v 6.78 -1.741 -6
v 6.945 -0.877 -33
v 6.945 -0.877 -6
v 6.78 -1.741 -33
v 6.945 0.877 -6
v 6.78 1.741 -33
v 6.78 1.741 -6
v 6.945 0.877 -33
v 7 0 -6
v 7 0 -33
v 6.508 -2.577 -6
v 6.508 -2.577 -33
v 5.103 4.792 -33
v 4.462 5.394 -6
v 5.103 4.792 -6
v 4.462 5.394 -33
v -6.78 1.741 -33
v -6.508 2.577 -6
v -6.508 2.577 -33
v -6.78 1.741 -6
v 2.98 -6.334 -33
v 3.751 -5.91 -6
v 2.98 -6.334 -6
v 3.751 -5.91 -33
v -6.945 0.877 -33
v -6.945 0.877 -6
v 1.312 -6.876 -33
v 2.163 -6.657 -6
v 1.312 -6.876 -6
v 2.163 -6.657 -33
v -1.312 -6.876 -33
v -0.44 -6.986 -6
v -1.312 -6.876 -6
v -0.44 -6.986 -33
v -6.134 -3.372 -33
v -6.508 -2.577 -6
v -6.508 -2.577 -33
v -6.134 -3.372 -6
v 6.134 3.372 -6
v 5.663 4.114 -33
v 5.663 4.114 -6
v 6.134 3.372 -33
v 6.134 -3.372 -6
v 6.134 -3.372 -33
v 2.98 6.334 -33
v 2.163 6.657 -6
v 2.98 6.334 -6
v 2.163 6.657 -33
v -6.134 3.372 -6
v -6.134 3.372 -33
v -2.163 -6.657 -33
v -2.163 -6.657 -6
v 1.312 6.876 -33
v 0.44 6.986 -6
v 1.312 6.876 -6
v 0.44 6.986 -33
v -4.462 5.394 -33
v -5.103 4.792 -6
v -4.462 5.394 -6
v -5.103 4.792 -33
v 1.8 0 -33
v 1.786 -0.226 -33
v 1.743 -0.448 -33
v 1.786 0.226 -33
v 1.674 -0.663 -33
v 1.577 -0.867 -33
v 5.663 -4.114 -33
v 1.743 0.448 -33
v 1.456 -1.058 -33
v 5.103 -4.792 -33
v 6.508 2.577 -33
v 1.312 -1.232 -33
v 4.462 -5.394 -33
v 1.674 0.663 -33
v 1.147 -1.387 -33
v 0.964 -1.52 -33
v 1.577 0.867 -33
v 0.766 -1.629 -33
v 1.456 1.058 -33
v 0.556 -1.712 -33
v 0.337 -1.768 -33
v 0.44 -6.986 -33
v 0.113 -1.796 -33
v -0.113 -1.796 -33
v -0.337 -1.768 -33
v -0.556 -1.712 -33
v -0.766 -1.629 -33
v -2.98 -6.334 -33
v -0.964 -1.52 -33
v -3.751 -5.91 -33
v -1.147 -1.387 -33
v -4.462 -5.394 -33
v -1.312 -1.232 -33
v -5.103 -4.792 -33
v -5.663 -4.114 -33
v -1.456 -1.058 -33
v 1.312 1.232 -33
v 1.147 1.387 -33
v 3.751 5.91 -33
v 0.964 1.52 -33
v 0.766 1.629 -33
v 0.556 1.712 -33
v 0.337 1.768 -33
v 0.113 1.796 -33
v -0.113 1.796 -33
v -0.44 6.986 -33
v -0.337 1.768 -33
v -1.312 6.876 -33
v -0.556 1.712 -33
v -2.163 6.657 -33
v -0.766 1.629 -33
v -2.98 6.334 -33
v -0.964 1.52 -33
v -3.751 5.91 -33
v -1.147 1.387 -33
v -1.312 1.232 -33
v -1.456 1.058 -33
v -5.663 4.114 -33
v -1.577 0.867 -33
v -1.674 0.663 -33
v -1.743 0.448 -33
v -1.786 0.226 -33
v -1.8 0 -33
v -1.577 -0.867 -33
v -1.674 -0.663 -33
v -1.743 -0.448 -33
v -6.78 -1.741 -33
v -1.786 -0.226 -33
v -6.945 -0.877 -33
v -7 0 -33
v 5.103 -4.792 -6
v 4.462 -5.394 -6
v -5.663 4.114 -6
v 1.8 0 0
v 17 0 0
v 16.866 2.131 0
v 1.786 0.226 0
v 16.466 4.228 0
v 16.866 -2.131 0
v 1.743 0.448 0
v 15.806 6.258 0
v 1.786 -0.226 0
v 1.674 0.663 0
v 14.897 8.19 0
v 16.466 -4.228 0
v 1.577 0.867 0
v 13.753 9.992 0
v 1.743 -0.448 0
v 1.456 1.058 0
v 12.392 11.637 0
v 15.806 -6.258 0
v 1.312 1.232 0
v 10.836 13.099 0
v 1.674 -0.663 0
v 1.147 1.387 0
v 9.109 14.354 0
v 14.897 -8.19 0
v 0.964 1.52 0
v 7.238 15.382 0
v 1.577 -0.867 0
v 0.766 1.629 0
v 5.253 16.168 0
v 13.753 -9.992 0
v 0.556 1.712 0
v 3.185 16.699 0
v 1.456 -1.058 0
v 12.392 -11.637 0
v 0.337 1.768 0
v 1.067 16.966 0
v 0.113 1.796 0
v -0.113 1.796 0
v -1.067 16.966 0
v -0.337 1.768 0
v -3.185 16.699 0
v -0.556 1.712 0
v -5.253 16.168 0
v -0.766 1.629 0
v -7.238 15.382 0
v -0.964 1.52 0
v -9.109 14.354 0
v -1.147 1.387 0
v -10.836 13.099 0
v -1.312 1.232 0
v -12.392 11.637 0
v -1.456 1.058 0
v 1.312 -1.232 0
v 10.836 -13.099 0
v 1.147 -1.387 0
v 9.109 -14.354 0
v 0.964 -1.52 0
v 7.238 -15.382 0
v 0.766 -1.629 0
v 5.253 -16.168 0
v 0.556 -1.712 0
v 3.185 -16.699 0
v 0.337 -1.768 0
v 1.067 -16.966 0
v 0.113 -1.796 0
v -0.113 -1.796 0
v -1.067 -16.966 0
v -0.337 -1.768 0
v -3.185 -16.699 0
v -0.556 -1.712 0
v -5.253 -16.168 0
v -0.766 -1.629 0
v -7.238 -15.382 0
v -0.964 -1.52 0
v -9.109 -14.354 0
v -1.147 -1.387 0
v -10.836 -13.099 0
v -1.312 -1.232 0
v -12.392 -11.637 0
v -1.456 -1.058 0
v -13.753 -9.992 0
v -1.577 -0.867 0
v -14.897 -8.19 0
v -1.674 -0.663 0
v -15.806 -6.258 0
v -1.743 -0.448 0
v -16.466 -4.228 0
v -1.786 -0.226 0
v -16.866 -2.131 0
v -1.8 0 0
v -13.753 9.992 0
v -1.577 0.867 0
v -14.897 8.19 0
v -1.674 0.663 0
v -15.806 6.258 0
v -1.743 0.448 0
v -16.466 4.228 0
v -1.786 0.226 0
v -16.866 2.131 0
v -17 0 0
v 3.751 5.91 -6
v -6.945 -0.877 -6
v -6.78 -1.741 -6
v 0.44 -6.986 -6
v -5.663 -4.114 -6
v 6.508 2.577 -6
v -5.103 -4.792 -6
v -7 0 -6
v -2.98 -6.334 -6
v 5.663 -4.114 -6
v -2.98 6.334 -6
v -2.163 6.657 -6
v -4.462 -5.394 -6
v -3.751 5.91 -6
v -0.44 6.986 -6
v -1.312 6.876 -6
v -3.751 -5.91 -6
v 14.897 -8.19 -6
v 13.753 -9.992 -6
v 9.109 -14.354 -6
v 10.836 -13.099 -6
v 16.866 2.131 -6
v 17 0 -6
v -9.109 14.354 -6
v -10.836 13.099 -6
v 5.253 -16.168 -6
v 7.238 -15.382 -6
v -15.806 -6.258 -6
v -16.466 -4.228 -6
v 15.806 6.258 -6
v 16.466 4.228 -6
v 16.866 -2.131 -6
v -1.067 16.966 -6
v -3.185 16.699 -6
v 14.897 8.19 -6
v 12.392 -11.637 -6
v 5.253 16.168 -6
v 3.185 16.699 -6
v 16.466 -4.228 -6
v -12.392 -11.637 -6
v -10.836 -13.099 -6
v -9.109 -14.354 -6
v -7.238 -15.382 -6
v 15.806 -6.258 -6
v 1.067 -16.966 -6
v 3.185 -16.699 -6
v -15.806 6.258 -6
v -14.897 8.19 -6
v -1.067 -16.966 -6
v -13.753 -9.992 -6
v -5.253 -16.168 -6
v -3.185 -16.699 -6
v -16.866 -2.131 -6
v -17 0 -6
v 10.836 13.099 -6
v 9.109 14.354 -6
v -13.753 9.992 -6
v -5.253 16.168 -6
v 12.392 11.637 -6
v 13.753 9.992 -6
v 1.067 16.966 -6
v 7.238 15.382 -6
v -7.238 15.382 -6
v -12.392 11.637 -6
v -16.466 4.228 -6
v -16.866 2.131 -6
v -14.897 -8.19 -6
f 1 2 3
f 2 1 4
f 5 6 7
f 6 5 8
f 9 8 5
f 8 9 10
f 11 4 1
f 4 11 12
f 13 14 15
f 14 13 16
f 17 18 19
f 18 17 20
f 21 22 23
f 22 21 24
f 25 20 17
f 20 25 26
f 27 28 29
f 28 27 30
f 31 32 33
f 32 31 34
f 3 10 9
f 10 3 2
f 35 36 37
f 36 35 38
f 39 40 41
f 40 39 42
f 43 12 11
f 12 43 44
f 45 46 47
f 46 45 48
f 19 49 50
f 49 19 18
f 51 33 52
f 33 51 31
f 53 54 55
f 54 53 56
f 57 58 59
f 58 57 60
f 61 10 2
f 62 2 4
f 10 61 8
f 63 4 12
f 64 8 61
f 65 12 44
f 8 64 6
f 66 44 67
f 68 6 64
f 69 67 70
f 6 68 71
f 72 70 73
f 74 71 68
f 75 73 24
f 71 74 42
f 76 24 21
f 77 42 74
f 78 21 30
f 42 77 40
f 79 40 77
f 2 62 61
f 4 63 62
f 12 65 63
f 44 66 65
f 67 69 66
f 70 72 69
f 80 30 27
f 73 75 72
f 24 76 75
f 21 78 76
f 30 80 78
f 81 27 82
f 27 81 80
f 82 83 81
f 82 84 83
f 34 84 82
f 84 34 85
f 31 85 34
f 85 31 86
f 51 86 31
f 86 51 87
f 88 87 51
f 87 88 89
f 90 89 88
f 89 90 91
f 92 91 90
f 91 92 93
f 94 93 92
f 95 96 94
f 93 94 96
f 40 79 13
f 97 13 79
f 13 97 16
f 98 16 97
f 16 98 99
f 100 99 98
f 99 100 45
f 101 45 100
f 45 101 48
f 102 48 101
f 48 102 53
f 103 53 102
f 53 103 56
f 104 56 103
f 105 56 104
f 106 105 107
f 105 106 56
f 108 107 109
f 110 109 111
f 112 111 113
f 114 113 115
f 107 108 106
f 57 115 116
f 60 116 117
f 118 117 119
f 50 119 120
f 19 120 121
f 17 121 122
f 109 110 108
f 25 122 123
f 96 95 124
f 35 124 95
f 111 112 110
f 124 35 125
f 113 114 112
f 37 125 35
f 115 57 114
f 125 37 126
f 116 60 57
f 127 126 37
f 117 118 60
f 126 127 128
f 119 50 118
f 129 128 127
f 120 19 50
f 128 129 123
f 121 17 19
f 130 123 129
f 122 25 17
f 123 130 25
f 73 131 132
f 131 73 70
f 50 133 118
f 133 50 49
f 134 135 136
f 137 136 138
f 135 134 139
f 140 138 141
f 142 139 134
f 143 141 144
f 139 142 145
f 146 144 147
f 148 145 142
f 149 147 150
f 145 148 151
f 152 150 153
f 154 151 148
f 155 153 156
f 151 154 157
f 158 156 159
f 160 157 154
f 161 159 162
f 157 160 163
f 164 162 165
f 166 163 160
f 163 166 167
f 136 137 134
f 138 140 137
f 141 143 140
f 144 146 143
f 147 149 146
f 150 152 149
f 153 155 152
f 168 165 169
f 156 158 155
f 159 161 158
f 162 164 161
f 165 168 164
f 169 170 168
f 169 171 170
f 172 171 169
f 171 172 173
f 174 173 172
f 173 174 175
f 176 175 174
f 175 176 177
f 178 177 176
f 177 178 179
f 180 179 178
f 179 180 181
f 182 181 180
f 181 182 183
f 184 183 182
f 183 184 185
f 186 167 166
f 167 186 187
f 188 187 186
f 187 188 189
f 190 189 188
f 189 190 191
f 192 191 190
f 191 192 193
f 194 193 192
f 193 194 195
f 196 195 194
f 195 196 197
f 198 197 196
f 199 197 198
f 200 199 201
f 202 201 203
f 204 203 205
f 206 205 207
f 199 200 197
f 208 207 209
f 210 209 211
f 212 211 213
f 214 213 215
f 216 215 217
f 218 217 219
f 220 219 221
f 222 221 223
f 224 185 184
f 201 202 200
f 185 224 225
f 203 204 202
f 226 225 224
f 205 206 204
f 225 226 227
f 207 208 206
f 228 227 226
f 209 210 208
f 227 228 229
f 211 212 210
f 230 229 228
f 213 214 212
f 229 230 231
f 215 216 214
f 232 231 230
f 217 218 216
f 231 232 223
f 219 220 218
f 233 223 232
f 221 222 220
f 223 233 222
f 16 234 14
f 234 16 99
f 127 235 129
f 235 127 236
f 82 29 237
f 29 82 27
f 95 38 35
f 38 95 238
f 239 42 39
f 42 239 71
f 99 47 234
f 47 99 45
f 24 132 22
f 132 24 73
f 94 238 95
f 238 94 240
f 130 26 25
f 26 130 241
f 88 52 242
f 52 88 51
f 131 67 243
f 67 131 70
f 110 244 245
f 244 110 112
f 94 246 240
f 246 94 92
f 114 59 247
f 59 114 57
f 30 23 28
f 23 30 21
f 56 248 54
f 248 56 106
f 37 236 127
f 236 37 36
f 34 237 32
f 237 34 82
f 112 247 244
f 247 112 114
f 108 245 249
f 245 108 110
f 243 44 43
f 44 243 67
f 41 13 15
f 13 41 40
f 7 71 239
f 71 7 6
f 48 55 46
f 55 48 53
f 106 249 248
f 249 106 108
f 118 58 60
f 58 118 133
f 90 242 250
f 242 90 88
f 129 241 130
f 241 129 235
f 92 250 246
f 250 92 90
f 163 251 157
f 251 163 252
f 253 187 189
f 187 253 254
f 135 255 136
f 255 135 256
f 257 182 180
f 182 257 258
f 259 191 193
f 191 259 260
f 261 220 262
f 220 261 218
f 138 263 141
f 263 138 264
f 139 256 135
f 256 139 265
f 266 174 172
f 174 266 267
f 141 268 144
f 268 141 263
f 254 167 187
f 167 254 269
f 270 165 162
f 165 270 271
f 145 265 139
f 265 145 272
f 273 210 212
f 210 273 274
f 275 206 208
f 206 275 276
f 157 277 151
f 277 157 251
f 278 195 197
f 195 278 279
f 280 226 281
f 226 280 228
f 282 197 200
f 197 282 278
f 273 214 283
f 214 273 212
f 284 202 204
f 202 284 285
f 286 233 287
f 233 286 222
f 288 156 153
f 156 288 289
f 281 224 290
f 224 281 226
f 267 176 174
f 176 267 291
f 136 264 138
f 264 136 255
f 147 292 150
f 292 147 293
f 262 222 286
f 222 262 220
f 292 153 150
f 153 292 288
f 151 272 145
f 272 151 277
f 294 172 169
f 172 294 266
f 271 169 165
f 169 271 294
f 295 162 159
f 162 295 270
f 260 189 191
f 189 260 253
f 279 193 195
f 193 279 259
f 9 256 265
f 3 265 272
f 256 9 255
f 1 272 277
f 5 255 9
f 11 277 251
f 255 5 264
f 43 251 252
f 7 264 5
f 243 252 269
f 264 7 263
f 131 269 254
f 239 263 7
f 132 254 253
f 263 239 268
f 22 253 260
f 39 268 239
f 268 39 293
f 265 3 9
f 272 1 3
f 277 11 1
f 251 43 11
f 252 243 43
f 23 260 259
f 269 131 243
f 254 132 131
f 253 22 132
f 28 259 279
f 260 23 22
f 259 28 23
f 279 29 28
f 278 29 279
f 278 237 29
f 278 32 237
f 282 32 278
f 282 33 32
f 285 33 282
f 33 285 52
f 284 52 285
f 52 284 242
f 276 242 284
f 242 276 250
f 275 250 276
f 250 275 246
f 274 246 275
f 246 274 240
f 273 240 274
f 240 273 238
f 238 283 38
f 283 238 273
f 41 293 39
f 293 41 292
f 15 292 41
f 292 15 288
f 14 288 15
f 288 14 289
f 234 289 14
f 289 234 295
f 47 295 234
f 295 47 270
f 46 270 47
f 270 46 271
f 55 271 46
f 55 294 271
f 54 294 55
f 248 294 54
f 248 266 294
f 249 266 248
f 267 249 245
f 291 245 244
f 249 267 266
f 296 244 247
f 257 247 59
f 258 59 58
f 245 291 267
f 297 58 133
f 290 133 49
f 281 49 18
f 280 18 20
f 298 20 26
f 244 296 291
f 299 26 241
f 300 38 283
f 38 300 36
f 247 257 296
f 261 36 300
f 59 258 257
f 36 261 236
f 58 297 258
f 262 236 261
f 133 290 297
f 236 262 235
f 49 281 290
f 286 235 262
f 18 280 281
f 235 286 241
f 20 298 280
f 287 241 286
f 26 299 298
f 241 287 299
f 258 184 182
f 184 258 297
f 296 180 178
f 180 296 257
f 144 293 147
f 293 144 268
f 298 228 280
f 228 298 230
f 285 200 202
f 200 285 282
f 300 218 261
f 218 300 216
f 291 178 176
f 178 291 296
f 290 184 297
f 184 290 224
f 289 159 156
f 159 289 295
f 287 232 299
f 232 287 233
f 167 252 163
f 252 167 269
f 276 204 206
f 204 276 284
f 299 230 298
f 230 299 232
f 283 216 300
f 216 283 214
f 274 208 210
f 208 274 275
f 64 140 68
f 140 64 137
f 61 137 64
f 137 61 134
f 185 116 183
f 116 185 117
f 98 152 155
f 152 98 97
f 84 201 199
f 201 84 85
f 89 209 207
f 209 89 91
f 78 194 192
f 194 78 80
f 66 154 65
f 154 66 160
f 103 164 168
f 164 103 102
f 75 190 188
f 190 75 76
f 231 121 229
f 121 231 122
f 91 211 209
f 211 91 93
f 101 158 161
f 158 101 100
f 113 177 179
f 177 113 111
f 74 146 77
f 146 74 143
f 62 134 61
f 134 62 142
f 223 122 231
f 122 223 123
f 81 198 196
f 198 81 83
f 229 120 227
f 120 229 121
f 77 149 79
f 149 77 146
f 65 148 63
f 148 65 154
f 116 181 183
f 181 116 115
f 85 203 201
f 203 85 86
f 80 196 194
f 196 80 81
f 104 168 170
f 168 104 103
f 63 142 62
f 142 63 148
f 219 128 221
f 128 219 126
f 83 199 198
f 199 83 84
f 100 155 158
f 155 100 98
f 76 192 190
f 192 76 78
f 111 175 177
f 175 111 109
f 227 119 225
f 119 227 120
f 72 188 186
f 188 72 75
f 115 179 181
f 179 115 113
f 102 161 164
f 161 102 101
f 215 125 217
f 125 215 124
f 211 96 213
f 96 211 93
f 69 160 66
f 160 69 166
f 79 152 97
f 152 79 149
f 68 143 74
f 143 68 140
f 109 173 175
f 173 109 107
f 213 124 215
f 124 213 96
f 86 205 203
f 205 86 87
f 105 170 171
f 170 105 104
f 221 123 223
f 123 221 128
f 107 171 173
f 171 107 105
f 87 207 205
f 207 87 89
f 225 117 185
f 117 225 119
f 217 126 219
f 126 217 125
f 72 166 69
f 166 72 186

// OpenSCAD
$fn = 50;


difference() {
	union() {
		translate(v = [0, 0, -33.0000000000]) {
			cylinder(h = 33, r = 7.0000000000);
		}
		translate(v = [0, 0, -6.0000000000]) {
			cylinder(h = 6, r = 17.0000000000);
		}
	}
	union() {
		#translate(v = [0, 0, -33]) {
			cylinder(h = 33, r = 1.8000000000);
		}
	}
}
